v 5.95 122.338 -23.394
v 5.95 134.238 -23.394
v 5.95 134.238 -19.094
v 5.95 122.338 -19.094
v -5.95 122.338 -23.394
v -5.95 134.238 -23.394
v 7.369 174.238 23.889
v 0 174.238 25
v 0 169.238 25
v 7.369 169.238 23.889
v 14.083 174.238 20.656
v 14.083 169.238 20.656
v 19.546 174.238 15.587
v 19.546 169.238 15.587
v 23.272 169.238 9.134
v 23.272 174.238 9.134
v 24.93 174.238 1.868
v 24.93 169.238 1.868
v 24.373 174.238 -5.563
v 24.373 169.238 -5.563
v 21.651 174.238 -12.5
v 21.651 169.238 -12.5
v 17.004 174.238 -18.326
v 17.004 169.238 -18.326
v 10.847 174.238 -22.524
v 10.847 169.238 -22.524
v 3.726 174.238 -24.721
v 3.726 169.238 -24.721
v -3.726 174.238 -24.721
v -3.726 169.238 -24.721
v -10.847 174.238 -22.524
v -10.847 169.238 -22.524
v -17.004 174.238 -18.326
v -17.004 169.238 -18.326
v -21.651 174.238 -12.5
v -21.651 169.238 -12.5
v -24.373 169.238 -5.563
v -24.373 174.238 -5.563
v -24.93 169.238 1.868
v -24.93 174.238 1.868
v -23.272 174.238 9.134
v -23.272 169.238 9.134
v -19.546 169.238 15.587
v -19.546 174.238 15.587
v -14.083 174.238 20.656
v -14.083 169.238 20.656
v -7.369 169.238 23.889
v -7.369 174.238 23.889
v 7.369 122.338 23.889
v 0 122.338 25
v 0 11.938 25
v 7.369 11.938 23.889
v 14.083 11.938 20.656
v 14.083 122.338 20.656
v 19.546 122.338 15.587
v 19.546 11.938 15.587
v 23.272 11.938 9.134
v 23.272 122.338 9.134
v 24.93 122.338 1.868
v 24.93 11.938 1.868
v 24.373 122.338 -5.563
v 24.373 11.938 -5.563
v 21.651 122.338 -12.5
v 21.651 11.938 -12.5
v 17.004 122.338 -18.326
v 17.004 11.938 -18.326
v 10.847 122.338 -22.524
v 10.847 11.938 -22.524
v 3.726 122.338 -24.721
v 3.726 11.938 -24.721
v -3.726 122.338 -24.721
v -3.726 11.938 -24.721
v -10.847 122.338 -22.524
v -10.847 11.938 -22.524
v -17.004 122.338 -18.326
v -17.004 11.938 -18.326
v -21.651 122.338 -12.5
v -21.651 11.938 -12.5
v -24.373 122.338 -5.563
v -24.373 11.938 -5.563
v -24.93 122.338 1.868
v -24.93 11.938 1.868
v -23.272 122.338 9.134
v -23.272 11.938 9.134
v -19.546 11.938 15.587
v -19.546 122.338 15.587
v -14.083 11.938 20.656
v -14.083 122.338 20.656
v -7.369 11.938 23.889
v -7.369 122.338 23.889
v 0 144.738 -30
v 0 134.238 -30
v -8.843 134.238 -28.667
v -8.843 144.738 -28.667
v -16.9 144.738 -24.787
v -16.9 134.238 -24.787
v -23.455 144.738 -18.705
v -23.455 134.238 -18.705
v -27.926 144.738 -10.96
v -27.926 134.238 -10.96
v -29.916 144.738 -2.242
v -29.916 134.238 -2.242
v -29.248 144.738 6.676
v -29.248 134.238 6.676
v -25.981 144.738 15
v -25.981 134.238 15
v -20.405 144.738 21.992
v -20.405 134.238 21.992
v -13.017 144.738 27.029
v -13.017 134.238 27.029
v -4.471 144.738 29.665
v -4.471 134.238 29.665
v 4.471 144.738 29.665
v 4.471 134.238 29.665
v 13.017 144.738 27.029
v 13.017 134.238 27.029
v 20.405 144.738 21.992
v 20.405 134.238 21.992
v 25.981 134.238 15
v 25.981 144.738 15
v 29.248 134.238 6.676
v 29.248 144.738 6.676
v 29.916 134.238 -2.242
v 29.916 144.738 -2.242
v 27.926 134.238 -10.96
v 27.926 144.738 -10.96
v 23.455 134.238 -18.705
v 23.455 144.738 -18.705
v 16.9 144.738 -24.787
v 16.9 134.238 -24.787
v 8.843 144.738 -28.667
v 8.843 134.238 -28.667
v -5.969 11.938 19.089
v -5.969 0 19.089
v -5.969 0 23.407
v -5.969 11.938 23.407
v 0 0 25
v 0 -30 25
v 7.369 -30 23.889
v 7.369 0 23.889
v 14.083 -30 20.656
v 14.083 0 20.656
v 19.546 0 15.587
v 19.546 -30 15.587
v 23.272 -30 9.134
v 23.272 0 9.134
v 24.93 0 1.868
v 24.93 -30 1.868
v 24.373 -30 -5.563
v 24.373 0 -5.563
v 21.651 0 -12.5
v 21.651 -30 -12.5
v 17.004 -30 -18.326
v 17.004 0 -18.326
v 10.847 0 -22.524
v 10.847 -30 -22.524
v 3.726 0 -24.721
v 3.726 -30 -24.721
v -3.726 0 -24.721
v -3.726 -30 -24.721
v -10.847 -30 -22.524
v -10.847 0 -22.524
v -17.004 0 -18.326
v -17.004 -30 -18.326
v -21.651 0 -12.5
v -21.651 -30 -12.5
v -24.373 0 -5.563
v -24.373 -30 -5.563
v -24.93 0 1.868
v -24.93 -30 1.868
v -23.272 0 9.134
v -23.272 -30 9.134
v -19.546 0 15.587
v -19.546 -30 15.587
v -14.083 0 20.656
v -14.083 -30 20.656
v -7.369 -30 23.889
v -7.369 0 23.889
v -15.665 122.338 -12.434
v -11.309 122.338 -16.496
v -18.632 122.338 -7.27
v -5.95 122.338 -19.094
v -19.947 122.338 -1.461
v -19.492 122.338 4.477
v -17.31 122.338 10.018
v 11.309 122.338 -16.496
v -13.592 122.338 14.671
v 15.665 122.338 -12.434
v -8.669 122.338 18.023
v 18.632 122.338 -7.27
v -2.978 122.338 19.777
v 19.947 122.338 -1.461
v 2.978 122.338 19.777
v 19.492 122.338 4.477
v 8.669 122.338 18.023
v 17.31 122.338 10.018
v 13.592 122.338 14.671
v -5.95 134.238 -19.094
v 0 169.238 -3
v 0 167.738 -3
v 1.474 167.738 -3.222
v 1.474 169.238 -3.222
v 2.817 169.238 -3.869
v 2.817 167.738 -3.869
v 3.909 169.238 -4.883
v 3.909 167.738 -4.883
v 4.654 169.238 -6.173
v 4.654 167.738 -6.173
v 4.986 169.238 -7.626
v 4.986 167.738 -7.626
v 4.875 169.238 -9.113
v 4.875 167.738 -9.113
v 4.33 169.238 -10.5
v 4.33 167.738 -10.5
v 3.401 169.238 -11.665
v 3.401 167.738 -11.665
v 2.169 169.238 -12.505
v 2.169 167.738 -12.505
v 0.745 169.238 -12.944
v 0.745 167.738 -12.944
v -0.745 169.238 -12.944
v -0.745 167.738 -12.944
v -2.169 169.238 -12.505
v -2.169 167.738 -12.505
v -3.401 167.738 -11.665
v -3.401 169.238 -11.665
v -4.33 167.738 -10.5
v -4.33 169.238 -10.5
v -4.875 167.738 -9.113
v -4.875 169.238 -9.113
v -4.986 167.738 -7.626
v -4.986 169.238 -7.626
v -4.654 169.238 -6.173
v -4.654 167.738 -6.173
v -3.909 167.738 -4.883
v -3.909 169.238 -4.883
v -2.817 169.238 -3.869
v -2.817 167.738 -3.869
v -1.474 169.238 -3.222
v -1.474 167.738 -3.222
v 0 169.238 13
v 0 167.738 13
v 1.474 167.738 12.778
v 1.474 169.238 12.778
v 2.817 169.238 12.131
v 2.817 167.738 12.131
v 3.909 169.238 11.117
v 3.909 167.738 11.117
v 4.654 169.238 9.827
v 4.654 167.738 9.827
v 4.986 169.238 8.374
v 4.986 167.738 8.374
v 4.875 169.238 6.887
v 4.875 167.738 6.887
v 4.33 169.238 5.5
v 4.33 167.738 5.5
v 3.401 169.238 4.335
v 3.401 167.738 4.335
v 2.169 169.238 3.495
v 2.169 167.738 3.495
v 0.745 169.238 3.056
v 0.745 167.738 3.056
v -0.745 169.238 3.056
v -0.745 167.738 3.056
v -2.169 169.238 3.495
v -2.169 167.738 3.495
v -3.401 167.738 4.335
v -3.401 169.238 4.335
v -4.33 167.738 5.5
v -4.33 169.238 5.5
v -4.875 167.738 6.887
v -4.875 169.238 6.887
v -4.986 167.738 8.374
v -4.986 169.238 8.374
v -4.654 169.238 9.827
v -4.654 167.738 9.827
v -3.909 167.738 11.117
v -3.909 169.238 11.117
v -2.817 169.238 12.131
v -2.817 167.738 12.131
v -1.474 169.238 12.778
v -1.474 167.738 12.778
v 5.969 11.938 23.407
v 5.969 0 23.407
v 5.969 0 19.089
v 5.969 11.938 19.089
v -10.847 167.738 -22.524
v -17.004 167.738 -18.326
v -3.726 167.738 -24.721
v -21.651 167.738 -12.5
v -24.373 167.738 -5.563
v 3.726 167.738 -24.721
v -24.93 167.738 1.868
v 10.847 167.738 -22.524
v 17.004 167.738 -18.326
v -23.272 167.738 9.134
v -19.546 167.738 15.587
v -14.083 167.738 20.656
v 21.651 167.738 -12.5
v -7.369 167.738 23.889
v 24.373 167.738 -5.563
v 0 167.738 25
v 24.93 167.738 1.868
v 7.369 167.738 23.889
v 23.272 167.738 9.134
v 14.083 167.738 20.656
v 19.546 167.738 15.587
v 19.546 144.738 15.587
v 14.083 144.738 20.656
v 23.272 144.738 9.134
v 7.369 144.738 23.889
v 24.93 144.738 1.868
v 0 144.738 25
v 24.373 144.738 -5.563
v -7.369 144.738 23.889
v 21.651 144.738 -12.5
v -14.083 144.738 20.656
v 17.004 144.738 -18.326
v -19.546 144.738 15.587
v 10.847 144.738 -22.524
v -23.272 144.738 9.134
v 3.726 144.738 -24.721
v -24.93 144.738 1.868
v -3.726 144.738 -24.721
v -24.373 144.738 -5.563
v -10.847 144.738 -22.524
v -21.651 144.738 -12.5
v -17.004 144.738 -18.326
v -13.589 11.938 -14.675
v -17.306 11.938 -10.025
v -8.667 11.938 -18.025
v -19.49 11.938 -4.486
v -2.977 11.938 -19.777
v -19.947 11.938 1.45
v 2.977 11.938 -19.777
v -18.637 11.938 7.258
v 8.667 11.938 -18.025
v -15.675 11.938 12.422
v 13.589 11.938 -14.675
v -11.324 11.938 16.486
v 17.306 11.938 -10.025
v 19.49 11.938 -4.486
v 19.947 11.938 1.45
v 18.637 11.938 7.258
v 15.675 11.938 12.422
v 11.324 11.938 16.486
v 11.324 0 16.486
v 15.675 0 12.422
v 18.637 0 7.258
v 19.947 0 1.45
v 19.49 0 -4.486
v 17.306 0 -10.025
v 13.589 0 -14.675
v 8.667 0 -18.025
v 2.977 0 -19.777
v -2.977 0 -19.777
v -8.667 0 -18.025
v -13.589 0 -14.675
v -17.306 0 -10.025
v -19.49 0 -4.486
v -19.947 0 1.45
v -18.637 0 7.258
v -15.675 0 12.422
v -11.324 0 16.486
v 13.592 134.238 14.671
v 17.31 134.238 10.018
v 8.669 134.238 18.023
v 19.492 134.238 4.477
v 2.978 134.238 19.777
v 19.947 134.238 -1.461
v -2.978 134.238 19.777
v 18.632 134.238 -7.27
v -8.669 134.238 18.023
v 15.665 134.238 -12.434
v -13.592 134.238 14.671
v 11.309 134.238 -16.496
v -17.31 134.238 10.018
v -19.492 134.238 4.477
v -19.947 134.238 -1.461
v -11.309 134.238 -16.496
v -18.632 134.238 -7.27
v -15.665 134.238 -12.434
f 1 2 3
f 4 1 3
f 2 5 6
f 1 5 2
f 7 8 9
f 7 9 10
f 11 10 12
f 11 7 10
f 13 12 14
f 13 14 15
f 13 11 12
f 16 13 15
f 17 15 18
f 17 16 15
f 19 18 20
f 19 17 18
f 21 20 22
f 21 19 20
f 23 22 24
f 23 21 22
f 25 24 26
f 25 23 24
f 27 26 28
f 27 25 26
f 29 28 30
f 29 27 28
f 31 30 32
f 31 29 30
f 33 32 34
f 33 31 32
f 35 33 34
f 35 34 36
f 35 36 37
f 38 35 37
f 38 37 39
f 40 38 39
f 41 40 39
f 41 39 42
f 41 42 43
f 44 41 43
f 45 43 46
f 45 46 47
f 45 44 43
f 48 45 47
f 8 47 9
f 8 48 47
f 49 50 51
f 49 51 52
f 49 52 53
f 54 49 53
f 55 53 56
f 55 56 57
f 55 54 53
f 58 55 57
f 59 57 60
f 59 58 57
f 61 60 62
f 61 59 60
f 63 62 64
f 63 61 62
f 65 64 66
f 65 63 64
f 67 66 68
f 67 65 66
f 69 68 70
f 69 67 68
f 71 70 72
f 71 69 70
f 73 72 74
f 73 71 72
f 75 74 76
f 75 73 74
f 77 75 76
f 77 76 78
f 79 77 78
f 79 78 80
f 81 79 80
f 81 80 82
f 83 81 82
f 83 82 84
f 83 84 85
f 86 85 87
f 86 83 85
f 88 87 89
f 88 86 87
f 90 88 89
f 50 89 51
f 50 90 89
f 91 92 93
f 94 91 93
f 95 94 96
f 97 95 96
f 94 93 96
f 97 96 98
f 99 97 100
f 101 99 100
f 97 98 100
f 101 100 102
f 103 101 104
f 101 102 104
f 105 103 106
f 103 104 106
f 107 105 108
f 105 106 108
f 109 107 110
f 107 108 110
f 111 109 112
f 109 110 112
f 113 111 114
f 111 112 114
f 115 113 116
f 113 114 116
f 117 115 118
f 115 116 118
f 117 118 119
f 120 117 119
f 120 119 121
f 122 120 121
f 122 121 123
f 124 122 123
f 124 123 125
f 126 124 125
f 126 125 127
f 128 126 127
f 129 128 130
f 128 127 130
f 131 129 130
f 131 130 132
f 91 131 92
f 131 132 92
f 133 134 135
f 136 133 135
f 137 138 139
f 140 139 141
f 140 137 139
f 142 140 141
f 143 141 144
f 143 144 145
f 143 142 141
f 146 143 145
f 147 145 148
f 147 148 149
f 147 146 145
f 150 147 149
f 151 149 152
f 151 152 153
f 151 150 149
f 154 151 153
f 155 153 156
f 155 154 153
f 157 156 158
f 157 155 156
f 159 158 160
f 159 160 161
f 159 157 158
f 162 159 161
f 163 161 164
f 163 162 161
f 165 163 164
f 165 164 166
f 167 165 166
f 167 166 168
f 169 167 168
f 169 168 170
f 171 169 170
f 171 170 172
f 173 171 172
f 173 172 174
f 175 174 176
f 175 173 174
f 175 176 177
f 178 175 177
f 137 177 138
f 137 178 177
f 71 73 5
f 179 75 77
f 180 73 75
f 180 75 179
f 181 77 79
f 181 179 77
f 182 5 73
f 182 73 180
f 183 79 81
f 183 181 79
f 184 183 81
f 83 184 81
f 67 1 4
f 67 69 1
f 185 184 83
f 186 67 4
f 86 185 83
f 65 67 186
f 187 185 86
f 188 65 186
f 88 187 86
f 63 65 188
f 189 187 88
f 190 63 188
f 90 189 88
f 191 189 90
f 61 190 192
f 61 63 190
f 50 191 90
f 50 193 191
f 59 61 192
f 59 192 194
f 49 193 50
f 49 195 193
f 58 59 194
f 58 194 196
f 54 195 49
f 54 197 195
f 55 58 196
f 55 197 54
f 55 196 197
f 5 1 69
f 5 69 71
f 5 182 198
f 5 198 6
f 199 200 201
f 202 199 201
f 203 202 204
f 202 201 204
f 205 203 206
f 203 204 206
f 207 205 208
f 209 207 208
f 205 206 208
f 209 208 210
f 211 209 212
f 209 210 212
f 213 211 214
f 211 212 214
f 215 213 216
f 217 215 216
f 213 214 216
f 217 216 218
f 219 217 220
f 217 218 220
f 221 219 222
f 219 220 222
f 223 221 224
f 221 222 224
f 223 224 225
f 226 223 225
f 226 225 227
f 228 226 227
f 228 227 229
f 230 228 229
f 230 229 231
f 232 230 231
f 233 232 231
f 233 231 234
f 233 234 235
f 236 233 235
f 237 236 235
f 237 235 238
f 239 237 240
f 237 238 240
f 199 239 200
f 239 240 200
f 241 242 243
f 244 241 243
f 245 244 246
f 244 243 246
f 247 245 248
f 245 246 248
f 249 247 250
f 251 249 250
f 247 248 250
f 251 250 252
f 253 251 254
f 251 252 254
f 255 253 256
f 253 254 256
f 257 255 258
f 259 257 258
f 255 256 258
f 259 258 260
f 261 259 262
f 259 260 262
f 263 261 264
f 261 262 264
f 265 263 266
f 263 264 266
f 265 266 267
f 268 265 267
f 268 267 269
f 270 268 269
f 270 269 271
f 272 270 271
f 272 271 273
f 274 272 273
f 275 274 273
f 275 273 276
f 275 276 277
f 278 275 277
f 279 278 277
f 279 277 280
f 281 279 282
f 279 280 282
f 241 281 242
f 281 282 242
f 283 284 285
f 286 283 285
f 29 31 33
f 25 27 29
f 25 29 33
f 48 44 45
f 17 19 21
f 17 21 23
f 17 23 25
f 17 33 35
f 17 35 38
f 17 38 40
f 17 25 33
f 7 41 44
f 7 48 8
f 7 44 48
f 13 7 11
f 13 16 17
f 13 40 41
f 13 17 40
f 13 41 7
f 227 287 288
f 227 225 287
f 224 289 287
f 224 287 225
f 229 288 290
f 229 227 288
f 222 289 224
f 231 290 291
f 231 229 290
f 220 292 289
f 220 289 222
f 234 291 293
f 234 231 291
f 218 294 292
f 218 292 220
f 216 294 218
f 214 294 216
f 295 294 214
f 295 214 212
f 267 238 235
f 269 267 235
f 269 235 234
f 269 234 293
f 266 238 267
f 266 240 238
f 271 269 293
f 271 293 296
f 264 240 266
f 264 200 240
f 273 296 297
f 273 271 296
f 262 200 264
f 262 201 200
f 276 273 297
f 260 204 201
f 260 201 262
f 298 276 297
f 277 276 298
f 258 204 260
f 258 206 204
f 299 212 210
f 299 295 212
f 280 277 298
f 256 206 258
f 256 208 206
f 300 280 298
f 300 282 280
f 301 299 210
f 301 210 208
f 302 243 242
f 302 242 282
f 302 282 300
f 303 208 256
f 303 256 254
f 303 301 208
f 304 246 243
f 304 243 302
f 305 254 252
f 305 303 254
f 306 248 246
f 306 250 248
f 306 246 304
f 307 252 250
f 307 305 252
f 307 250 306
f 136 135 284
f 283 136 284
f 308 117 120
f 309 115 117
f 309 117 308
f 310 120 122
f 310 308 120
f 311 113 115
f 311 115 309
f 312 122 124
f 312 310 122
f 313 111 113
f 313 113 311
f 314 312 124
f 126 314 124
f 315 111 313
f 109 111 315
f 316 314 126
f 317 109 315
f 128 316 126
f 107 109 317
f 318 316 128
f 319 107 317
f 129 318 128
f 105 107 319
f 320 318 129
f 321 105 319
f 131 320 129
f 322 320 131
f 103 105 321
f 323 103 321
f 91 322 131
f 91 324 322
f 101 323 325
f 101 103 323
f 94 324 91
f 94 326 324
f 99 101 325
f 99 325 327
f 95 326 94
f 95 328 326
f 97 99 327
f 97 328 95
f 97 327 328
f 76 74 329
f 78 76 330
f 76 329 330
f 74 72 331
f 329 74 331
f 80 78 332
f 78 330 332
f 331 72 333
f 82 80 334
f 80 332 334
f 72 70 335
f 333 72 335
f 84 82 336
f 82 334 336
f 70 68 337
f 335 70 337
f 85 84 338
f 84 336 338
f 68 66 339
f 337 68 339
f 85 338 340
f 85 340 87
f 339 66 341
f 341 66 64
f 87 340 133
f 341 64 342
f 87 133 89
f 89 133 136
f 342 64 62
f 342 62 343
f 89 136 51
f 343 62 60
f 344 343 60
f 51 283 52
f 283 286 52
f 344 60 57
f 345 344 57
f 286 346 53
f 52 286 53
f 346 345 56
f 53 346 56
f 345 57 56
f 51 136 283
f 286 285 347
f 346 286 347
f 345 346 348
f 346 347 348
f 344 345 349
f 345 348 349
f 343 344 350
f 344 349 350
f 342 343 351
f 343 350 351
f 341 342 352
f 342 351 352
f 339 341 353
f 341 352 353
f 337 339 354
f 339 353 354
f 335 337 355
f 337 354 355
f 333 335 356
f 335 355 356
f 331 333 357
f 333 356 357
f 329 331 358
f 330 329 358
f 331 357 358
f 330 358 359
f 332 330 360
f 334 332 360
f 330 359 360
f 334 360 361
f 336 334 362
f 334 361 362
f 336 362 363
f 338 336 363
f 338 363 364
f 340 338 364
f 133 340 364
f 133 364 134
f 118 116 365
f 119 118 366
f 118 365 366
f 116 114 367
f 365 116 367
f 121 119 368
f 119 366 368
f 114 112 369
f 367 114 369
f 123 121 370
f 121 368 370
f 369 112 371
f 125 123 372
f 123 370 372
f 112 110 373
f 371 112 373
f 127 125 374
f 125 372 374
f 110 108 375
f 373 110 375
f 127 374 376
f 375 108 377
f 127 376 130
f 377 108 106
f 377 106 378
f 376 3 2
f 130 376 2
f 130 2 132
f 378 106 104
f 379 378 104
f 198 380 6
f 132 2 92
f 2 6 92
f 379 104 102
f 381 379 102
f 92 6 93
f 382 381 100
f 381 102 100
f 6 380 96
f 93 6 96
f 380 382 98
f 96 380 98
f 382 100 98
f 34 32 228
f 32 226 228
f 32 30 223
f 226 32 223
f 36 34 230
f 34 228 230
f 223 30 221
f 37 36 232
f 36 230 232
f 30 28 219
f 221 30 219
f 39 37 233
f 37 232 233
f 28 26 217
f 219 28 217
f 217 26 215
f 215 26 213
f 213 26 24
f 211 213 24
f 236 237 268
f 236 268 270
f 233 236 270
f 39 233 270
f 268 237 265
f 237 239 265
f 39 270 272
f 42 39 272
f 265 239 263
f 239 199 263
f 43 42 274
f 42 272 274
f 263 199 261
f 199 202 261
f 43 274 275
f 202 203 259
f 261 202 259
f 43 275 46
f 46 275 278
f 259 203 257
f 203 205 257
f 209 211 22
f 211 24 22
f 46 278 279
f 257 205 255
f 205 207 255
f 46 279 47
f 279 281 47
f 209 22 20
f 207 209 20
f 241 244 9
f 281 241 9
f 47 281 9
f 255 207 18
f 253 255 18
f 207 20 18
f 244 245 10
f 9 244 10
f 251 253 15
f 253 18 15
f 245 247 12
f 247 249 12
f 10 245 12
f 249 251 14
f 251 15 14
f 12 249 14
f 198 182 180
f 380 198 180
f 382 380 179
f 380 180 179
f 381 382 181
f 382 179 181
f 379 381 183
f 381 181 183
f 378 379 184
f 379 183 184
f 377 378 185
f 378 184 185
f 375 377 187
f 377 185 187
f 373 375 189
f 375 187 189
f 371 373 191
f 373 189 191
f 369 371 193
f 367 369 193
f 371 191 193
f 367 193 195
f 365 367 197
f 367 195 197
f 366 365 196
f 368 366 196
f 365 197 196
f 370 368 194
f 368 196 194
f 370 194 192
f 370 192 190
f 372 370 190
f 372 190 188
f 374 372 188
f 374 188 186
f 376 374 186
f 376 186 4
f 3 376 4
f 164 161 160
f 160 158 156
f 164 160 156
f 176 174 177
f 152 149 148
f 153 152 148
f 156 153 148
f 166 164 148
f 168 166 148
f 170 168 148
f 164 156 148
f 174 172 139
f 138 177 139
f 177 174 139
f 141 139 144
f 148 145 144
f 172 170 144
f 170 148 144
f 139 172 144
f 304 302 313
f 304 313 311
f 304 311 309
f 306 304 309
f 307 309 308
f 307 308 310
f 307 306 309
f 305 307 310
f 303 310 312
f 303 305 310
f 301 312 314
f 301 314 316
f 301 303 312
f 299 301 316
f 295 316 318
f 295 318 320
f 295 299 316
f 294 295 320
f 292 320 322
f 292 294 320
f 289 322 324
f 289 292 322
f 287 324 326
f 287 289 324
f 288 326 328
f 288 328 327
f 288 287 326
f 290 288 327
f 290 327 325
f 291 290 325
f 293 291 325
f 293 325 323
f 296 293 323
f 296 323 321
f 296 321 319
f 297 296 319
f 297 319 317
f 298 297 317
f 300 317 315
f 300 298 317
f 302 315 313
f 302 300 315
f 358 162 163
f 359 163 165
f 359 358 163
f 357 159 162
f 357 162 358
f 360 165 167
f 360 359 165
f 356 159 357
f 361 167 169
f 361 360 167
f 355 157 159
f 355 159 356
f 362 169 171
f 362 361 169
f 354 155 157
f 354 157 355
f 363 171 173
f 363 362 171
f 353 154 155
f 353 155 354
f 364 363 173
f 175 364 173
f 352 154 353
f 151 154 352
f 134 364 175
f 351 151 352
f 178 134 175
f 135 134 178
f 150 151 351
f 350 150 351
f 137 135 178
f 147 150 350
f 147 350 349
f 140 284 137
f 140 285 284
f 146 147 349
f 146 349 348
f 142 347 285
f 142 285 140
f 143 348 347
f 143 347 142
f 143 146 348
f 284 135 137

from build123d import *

# Parameters (mm, degrees)
SKETCH1_R            = 20
BOSS_EXTRUDE4_DEPTH  = 11.938
SKETCH2_R            = 25
BOSS_EXTRUDE8_DEPTH  = 30
BOSS_EXTRUDE9_START  = 110.4
SKETCH7_R            = 25
BOSS_EXTRUDE9_DEPTH  = 110.4
SKETCH8_R            = 20
BOSS_EXTRUDE11_DEPTH = 11.9
BOSS_EXTRUDE12_START = -12.9
BOSS_EXTRUDE12_DEPTH = 12.9
SKETCH12_R           = 30
BOSS_EXTRUDE14_DEPTH = 10.5
BOSS_EXTRUDE15_START = 23
SKETCH14_R           = 25
BOSS_EXTRUDE15_DEPTH = 23
SKETCH15_R           = 5
BOSS_EXTRUDE17_DEPTH = 1.5
BOSS_EXTRUDE21_START = 5
SKETCH17_R           = 25
BOSS_EXTRUDE21_DEPTH = 5


with BuildPart() as part:
    # Sketch1 → Boss-Extrude4 (new body)
    with BuildSketch(Plane(origin=(0, 0, 0), x_dir=(1, 0, 0), z_dir=(0, 1, 0))):
        Circle(SKETCH1_R)
        with BuildLine():
            Line((-5.969, -19.088505416), (-5.969, -23.406505416))
            Line((-5.969, -23.406505416), (5.969, -23.406505416))
            Line((5.969, -23.406505416), (5.969, -19.088505416))
            ThreePointArc((5.969, -19.088505416), (0, -20), (-5.969, -19.088505416))
        make_face()
    extrude(amount=BOSS_EXTRUDE4_DEPTH)

    # Sketch2 → Boss-Extrude8 (add)
    with BuildSketch(Plane(origin=(0, 0, 0), x_dir=(1, 0, 0), z_dir=(0, 1, 0))):
        with Locations(Location((0, 0, 0), (0, 0, 270))):
            Circle(SKETCH2_R)
    extrude(amount=-BOSS_EXTRUDE8_DEPTH)

    # Sketch7 → Boss-Extrude9 (add)
    with BuildSketch(Plane(origin=(0, 11.938, 0), x_dir=(1, 0, 0), z_dir=(0, 1, 0)).offset(BOSS_EXTRUDE9_START)):
        with Locations(Location((0, 0, 0), (0, 0, 270))):
            Circle(SKETCH7_R)
    extrude(amount=-BOSS_EXTRUDE9_DEPTH)

    # Sketch8 → Boss-Extrude11 (add)
    with BuildSketch(Plane(origin=(0, 122.338, 0), x_dir=(1, 0, 0), z_dir=(0, 1, 0))):
        with Locations(Location((0, 0, 0), (0, 0, 90))):
            Circle(SKETCH8_R)
    extrude(amount=BOSS_EXTRUDE11_DEPTH)

    # Sketch9 → Boss-Extrude12 (add)
    with BuildSketch(Plane(origin=(0, 134.238, 0), x_dir=(1, 0, 0), z_dir=(0, 1, 0)).offset(BOSS_EXTRUDE12_START)):
        with BuildLine():
            Line((-5.95, 19.094436362), (-5.95, 23.394436362))
            Line((-5.95, 23.394436362), (5.95, 23.394436362))
            Line((5.95, 23.394436362), (5.95, 19.094436362))
            ThreePointArc((5.95, 19.094436362), (0, 20), (-5.95, 19.094436362))
        make_face()
    extrude(amount=BOSS_EXTRUDE12_DEPTH)

    # Sketch12 → Boss-Extrude14 (add)
    with BuildSketch(Plane(origin=(0, 134.238, 0), x_dir=(1, 0, 0), z_dir=(0, 1, 0))):
        with Locations(Location((0, 0, 0), (0, 0, 90))):
            Circle(SKETCH12_R)
    extrude(amount=BOSS_EXTRUDE14_DEPTH)

    # Sketch14 → Boss-Extrude15 (add)
    with BuildSketch(Plane(origin=(0, 144.738, 0), x_dir=(1, 0, 0), z_dir=(0, 1, 0)).offset(BOSS_EXTRUDE15_START)):
        with Locations(Location((0, 0, 0), (0, 0, 270))):
            Circle(SKETCH14_R)
    extrude(amount=-BOSS_EXTRUDE15_DEPTH)

    # Sketch15 → Boss-Extrude17 (add)
    with BuildSketch(Plane(origin=(0, 167.738, 0), x_dir=(1, 0, 0), z_dir=(0, 1, 0))):
        with Locations(Location((0, 8, 0), (0, 0, 270))):
            Circle(SKETCH15_R)
        with Locations(Location((0, -8, 0), (0, 0, 270))):
            Circle(SKETCH15_R)
    extrude(amount=BOSS_EXTRUDE17_DEPTH)

    # Sketch17 → Boss-Extrude21 (add)
    with BuildSketch(Plane(origin=(0, 169.238, 0), x_dir=(1, 0, 0), z_dir=(0, 1, 0)).offset(BOSS_EXTRUDE21_START)):
        with Locations(Location((0, 0, 0), (0, 0, 270))):
            Circle(SKETCH17_R)
    extrude(amount=-BOSS_EXTRUDE21_DEPTH)


solid = part.part
